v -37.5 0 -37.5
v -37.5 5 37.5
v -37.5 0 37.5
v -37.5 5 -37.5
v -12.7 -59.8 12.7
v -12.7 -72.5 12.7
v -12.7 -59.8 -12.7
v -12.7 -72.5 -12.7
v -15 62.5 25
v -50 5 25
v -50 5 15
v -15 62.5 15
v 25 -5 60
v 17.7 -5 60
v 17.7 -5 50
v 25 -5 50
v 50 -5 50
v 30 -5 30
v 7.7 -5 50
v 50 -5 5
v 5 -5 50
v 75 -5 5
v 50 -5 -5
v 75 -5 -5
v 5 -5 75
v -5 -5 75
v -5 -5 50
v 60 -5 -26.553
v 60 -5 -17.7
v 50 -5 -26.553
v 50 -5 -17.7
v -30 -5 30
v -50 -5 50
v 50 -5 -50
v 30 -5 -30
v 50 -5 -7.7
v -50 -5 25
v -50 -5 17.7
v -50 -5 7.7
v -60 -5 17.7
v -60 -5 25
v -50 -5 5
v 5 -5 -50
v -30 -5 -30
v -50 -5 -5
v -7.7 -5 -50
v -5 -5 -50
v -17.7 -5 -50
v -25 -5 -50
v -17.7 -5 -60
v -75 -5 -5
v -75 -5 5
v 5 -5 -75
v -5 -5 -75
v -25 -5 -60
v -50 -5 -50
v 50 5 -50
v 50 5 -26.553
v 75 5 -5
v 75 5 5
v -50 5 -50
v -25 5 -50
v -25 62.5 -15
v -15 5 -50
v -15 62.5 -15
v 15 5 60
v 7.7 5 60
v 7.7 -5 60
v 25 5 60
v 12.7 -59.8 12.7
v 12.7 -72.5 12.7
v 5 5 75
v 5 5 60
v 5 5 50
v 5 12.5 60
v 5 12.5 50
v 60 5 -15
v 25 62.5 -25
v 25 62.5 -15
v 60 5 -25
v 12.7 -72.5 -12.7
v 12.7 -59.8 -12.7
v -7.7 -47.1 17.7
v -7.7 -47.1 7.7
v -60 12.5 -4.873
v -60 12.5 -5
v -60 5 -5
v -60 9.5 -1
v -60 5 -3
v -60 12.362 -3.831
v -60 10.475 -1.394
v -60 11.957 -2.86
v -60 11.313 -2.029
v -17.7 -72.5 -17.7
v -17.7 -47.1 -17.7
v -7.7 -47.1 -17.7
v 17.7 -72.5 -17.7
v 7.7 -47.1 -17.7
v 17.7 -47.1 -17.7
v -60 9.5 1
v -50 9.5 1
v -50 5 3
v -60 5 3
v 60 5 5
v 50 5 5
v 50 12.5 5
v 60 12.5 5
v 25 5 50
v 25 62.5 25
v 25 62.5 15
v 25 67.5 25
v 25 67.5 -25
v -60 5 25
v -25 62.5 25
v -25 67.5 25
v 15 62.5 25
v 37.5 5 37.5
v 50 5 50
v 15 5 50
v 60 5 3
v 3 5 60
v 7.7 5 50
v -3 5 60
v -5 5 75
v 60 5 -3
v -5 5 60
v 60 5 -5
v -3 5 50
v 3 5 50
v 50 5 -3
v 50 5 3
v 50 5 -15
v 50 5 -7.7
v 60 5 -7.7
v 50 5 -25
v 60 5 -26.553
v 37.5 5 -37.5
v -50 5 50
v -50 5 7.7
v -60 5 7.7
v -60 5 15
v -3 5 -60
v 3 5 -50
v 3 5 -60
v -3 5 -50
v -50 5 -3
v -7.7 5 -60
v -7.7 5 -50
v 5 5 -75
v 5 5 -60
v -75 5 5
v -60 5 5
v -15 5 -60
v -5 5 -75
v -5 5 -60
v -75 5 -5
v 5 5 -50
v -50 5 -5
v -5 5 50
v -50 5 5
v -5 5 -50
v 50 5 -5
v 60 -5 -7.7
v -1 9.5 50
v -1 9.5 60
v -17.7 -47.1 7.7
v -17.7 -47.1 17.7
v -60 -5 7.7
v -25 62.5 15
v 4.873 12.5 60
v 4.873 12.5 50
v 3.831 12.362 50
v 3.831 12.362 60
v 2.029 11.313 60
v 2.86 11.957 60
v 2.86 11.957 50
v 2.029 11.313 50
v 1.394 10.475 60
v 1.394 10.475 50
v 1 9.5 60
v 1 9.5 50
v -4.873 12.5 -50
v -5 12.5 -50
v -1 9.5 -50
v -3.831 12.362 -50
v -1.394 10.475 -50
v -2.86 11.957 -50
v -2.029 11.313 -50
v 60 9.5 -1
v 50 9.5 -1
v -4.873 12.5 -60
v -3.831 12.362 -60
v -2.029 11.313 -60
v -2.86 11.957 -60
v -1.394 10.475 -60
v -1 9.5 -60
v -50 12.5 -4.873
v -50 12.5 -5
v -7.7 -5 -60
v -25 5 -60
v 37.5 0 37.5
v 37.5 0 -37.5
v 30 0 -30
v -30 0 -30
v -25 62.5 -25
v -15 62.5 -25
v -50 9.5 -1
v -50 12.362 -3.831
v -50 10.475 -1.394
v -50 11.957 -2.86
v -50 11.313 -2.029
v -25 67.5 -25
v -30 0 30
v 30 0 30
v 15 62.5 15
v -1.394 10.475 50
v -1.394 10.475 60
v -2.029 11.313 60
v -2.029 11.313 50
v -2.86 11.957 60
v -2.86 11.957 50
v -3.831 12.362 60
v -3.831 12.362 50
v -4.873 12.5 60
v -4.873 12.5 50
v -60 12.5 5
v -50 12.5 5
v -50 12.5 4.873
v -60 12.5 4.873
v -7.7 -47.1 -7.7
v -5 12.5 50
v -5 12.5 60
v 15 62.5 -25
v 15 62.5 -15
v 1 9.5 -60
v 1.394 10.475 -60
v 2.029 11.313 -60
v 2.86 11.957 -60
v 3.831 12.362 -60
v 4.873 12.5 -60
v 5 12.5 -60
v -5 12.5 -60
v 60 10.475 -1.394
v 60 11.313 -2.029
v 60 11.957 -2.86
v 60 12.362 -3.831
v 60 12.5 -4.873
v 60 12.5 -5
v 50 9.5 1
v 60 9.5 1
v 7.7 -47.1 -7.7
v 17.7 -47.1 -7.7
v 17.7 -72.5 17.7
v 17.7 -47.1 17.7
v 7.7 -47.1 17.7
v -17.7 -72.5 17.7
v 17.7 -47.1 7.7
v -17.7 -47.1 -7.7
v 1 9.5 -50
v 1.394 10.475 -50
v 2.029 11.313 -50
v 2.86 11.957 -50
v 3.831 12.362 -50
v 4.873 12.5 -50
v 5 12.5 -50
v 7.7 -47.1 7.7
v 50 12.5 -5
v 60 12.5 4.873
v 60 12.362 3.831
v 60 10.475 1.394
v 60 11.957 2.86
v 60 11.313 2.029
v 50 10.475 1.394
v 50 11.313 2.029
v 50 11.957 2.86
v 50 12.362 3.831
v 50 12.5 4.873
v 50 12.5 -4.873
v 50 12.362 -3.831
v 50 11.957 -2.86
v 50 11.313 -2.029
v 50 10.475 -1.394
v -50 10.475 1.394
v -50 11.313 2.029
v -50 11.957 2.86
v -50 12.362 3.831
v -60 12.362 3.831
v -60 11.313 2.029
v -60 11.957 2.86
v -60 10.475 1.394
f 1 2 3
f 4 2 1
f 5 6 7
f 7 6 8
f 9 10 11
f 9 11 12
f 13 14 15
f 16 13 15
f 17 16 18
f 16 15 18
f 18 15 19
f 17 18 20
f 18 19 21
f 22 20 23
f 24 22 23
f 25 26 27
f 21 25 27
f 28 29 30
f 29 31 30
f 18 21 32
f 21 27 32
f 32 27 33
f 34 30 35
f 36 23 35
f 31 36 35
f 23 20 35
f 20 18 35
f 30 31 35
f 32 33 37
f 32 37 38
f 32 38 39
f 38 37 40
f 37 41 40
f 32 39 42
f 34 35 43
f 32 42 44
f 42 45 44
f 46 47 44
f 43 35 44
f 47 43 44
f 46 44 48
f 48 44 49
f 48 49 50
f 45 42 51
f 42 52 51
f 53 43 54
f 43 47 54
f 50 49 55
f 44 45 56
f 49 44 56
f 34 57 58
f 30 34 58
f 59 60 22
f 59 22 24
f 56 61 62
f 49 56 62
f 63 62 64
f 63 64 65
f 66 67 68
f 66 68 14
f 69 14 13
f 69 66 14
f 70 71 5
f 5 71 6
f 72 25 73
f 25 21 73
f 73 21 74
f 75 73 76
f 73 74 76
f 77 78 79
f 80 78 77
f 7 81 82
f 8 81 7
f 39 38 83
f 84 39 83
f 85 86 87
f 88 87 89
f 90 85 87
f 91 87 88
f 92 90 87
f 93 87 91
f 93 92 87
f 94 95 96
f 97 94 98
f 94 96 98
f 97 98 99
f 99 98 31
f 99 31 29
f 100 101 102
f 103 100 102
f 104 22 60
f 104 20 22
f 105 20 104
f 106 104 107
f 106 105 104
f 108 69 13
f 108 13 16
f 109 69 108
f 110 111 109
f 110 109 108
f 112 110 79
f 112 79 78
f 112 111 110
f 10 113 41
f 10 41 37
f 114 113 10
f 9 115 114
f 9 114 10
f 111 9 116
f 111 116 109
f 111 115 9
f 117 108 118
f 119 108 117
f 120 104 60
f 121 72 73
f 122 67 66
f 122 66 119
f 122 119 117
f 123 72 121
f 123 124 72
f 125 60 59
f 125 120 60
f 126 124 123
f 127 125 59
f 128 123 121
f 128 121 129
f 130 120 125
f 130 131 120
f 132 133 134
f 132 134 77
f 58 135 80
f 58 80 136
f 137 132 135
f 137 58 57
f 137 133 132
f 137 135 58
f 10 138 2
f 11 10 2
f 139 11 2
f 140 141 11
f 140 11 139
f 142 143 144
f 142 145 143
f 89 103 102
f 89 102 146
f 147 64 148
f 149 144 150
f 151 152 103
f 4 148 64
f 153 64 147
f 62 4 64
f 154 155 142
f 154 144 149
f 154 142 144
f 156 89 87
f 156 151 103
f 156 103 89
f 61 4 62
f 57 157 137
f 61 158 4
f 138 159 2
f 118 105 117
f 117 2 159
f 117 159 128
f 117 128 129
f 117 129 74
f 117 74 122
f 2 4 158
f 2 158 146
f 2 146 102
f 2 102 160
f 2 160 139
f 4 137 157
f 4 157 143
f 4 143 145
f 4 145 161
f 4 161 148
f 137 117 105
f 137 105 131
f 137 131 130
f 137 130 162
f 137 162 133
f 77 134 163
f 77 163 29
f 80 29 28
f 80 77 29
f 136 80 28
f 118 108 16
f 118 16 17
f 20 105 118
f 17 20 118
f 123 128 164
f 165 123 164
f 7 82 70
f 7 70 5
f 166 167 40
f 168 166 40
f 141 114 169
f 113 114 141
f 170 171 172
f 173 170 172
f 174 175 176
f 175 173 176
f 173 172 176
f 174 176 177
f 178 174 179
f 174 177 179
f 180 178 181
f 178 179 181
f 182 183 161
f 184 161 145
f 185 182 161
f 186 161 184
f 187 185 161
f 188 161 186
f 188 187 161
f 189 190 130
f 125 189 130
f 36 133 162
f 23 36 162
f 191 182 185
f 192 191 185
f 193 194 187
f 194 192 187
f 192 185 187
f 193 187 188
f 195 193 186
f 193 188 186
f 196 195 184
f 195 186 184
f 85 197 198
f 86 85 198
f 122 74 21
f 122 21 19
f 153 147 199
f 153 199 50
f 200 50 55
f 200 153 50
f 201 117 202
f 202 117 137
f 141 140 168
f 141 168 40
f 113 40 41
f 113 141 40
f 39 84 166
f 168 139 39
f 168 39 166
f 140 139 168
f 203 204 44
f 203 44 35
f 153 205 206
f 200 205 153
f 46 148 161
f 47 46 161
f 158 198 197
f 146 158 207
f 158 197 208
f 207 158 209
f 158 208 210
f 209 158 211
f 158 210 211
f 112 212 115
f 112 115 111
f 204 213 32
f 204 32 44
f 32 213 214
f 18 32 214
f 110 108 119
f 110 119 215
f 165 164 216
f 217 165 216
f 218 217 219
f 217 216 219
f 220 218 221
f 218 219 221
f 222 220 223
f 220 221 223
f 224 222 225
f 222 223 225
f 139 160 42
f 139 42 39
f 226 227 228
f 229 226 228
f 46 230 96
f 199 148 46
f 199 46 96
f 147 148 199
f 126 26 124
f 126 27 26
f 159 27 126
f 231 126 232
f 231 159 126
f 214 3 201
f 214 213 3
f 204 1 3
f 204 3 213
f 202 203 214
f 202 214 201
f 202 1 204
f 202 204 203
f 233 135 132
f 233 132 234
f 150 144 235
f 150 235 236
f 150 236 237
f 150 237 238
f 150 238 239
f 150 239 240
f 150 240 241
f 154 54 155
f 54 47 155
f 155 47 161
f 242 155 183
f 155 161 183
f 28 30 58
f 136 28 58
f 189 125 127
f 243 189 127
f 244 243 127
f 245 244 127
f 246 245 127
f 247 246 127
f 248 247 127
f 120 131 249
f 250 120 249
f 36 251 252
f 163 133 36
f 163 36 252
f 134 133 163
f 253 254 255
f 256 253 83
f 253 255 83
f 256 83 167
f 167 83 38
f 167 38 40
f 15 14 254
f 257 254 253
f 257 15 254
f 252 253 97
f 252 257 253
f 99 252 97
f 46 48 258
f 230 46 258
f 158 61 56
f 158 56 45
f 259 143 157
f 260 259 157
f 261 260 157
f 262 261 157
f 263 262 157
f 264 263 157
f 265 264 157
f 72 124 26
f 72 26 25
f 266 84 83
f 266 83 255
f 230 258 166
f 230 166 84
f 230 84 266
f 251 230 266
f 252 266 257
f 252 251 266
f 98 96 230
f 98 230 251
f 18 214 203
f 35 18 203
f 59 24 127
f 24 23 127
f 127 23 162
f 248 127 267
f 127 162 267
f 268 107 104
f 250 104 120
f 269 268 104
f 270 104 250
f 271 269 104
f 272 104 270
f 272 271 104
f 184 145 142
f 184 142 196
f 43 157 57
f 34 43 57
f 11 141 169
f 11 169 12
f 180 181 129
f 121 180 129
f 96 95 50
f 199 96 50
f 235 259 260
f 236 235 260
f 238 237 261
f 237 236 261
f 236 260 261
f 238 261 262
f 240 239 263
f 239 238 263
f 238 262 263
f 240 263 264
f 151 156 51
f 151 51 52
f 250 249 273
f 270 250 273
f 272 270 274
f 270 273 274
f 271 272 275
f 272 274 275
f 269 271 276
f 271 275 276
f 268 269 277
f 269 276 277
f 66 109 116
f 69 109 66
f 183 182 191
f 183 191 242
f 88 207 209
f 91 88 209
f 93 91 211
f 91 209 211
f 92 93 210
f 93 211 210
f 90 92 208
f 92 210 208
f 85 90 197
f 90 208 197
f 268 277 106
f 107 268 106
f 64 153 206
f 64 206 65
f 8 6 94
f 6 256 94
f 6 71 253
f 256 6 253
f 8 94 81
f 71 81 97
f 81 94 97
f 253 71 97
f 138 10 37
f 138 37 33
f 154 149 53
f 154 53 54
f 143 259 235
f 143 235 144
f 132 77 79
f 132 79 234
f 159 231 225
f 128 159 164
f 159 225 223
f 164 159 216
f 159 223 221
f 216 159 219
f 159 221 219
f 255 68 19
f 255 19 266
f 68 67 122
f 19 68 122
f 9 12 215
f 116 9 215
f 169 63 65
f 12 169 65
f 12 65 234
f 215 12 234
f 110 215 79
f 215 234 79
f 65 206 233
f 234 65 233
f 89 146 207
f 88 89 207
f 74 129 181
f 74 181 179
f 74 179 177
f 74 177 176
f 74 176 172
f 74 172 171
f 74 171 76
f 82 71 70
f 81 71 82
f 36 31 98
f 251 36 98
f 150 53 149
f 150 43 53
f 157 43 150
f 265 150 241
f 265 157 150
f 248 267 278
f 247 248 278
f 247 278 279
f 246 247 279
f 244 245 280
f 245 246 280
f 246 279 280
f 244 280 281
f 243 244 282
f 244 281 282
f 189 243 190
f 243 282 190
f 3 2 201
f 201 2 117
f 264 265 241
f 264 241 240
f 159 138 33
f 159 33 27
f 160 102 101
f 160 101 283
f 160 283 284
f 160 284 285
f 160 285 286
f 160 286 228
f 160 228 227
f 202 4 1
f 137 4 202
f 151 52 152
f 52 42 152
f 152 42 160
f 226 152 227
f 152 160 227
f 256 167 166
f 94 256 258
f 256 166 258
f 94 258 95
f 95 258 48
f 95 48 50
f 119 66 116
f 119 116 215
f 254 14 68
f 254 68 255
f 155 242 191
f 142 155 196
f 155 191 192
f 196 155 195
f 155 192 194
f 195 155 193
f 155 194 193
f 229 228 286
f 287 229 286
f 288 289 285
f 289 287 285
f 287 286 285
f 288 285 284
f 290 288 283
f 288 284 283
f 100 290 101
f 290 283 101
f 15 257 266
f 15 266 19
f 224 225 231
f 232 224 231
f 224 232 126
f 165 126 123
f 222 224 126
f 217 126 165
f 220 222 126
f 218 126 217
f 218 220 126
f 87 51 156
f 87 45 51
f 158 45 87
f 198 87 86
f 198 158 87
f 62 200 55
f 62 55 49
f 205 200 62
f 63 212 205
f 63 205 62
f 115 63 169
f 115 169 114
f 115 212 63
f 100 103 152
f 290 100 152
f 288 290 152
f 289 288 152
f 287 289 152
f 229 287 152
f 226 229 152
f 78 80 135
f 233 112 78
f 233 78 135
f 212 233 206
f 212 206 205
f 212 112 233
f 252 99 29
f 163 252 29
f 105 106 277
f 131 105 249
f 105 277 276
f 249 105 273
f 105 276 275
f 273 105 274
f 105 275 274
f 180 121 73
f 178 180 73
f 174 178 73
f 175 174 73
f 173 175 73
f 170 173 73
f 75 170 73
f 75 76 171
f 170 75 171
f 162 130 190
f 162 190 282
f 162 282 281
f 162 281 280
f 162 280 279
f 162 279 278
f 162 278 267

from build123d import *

# Parameters (mm, degrees)
SKETCH2_W            = 100
SKETCH2_H            = 100
BOSS_EXTRUDE1_DEPTH  = 5
SKETCH3_W            = 100
SKETCH3_H            = 100
BOSS_EXTRUDE2_DEPTH  = 5
SKETCH8_R            = 5
BOSS_EXTRUDE7_DEPTH  = 30
BOSS_EXTRUDE21_DEPTH = 10
FILLET14_R           = 4
FILLET13_R           = 4
SKETCH24_W           = 10
SKETCH24_H           = 10
BOSS_EXTRUDE22_DEPTH = 15
BOSS_EXTRUDE25_DEPTH = 10
SKETCH26_W           = 10
SKETCH26_H           = 10
BOSS_EXTRUDE26_DEPTH = 15
FILLET18_R           = 4
FILLET17_R           = 4
BOSS_EXTRUDE23_DEPTH = 10
SKETCH25_W           = 10
SKETCH25_H           = 10
BOSS_EXTRUDE24_DEPTH = 15
FILLET15_R           = 4
FILLET16_R           = 4
BOSS_EXTRUDE10_DEPTH = 10
FILLET19_R           = 4
SKETCH27_W           = 10
SKETCH27_H           = 10
BOSS_EXTRUDE27_DEPTH = 15
FILLET20_R           = 4
SKETCH62_R           = 11.223510807
CUT_EXTRUDE3_DEPTH   = 30
SKETCH64_W           = 35.4
SKETCH64_H           = 35.4
BOSS_EXTRUDE53_DEPTH = 25.4
SKETCH66_W           = 25.4
SKETCH66_H           = 25.4
CUT_EXTRUDE4_DEPTH   = 12.7
SKETCH67_W           = 50
SKETCH67_H           = 50
BOSS_EXTRUDE54_DEPTH = 5
SKETCH68_W           = 17.3
SKETCH68_H           = 10
BOSS_EXTRUDE55_DEPTH = 10
SKETCH69_W           = 17.3
SKETCH69_H           = 10
BOSS_EXTRUDE56_DEPTH = 10
SKETCH70_W           = 17.3
SKETCH70_H           = 10
BOSS_EXTRUDE57_DEPTH = 10
SKETCH74_W           = 17.3
SKETCH74_H           = 10
BOSS_EXTRUDE58_DEPTH = 10
BOSS_EXTRUDE59_DEPTH = 10
BOSS_EXTRUDE60_DEPTH = 10
BOSS_EXTRUDE61_DEPTH = 10
BOSS_EXTRUDE62_DEPTH = 10
BOSS_EXTRUDE63_DEPTH = 10
BOSS_EXTRUDE64_DEPTH = 10
SKETCH85_W           = 17.3
SKETCH85_H           = 10
BOSS_EXTRUDE65_DEPTH = 10
BOSS_EXTRUDE66_DEPTH = 10
BOSS_EXTRUDE67_DEPTH = 10
SKETCH90_W           = 75
SKETCH90_H           = 75
CUT_EXTRUDE5_DEPTH   = 5
SKETCH91_W           = 60
SKETCH91_H           = 60
CUT_EXTRUDE6_DEPTH   = 10


with BuildPart() as part:
    # Sketch2 → Boss-Extrude1 (new body)
    with BuildSketch(Plane(origin=(0, 0, 0), x_dir=(1, 0, 0), z_dir=(0, 1, 0))):
        Rectangle(SKETCH2_W, SKETCH2_H)
    extrude(amount=BOSS_EXTRUDE1_DEPTH)

    # Sketch3 → Boss-Extrude2 (add)
    with BuildSketch(Plane.XZ):
        Rectangle(SKETCH3_W, SKETCH3_H)
    extrude(amount=BOSS_EXTRUDE2_DEPTH)

    # Sketch8 → Boss-Extrude7 (add)
    with BuildSketch(Plane.XZ.offset(5)):
        with Locations(Location((0, 0, 0), (0, 0, 90))):
            Circle(SKETCH8_R)
    extrude(amount=BOSS_EXTRUDE7_DEPTH)

    # Sketch11 → Boss-Extrude21 (add)
    with BuildSketch(Plane(origin=(50, 0, 0), x_dir=(0, 0, -1), z_dir=(1, 0, 0))):
        Polygon((5, -5), (5, 12.5), (1, 12.5), (1, 9.5), (3, 5), (-3, 5), (-1, 9.5), (-1, 12.5), (-5, 12.5), (-5, -5), align=None)
    extrude(amount=BOSS_EXTRUDE21_DEPTH)

    # Fillet14
    # the kernel refuses this fillet: 4 mm, written as the material it takes off along each edge
    with BuildSketch(Plane(origin=(40.317541634, 12.5, -1), x_dir=(0, -1, 0), z_dir=(1, 0, 0))) as fillet14_piece_1:
        with BuildLine():
            CenterArc((4, 3.872983346), FILLET14_R, 180, 75.522487814)
            Line((0, 3.872983346), (-0.08, 3.872983346))
            Line((-0.08, 3.872983346), (-0.08, 0))
            Line((-0.08, 0), (0, -0.08))
            ThreePointArc((0, -0.08), (1.5, -0.08), (2.98, -0.077459667))
            Line((2.98, -0.077459667), (3, 0))
        make_face()
    extrude(amount=29.364916731, mode=Mode.SUBTRACT)

    # Fillet13
    # the kernel refuses this fillet: 4 mm, written as the material it takes off along each edge
    with BuildSketch(Plane(origin=(40.317541634, 12.5, 1), x_dir=(0, 0, 1), z_dir=(1, 0, 0))) as fillet13_piece_1:
        with BuildLine():
            CenterArc((3.872983346, 4), FILLET13_R, 194.477512186, 75.522487814)
            Line((0, 3), (-0.077459667, 2.98))
            ThreePointArc((-0.077459667, 2.98), (-0.08, 1.5), (-0.08, 0))
            Line((-0.08, 0), (0, -0.08))
            Line((0, -0.08), (3.872983346, -0.08))
            Line((3.872983346, -0.08), (3.872983346, 0))
        make_face()
    extrude(amount=29.364916731, mode=Mode.SUBTRACT)

    # Sketch24 → Boss-Extrude22 (add)
    with BuildSketch(Plane(origin=(60, 0, 0), x_dir=(0, 0, -1), z_dir=(1, 0, 0))):
        Rectangle(SKETCH24_W, SKETCH24_H)
    extrude(amount=BOSS_EXTRUDE22_DEPTH)

    # Sketch13 → Boss-Extrude25 (add)
    with BuildSketch(Plane.ZY.offset(50)):
        Polygon((-5, 12.5), (-5, -5), (5, -5), (5, 12.5), (1, 12.5), (1, 9.5), (3, 5), (-3, 5), (-1, 9.5), (-1, 12.5), align=None)
    extrude(amount=BOSS_EXTRUDE25_DEPTH)

    # Sketch26 → Boss-Extrude26 (add)
    with BuildSketch(Plane.ZY.offset(60)):
        Rectangle(SKETCH26_W, SKETCH26_H)
    extrude(amount=BOSS_EXTRUDE26_DEPTH)

    # Fillet18
    # the kernel refuses this fillet: 4 mm, written as the material it takes off along each edge
    with BuildSketch(Plane(origin=(-40.317541634, 12.5, 1), x_dir=(0, -1, 0), z_dir=(-1, 0, 0))) as fillet18_piece_1:
        with BuildLine():
            CenterArc((4, 3.872983346), FILLET18_R, 180, 75.522487814)
            Line((0, 3.872983346), (-0.08, 3.872983346))
            Line((-0.08, 3.872983346), (-0.08, 0))
            Line((-0.08, 0), (0, -0.08))
            ThreePointArc((0, -0.08), (1.5, -0.08), (2.98, -0.077459667))
            Line((2.98, -0.077459667), (3, 0))
        make_face()
    extrude(amount=29.364916731, mode=Mode.SUBTRACT)

    # Fillet17
    # the kernel refuses this fillet: 4 mm, written as the material it takes off along each edge
    with BuildSketch(Plane(origin=(-40.317541634, 12.5, -1), x_dir=(0, 0, -1), z_dir=(-1, 0, 0))) as fillet17_piece_1:
        with BuildLine():
            CenterArc((3.872983346, 4), FILLET17_R, 194.477512186, 75.522487814)
            Line((0, 3), (-0.077459667, 2.98))
            ThreePointArc((-0.077459667, 2.98), (-0.08, 1.5), (-0.08, 0))
            Line((-0.08, 0), (0, -0.08))
            Line((0, -0.08), (3.872983346, -0.08))
            Line((3.872983346, -0.08), (3.872983346, 0))
        make_face()
    extrude(amount=29.364916731, mode=Mode.SUBTRACT)

    # Sketch14 → Boss-Extrude23 (add)
    with BuildSketch(Plane(origin=(0, 0, -50), x_dir=(-1, 0, 0), z_dir=(0, 0, -1))):
        Polygon((-5, 12.5), (-1, 12.5), (-1, 9.5), (-3, 5), (3, 5), (1, 9.5), (1, 12.5), (5, 12.5), (5, -5), (-5, -5), align=None)
    extrude(amount=BOSS_EXTRUDE23_DEPTH)

    # Sketch25 → Boss-Extrude24 (add)
    with BuildSketch(Plane(origin=(0, 0, -60), x_dir=(-1, 0, 0), z_dir=(0, 0, -1))):
        Rectangle(SKETCH25_W, SKETCH25_H)
    extrude(amount=BOSS_EXTRUDE24_DEPTH)

    # Fillet15
    # the kernel refuses this fillet: 4 mm, written as the material it takes off along each edge
    with BuildSketch(Plane(origin=(-1, 12.5, -40.317541634), x_dir=(0, -1, 0), z_dir=(0, 0, -1))) as fillet15_piece_1:
        with BuildLine():
            CenterArc((4, 3.872983346), FILLET15_R, 180, 75.522487814)
            Line((0, 3.872983346), (-0.08, 3.872983346))
            Line((-0.08, 3.872983346), (-0.08, 0))
            Line((-0.08, 0), (0, -0.08))
            ThreePointArc((0, -0.08), (1.5, -0.08), (2.98, -0.077459667))
            Line((2.98, -0.077459667), (3, 0))
        make_face()
    extrude(amount=29.364916731, mode=Mode.SUBTRACT)

    # Fillet16
    # the kernel refuses this fillet: 4 mm, written as the material it takes off along each edge
    with BuildSketch(Plane(origin=(1, 12.5, -40.317541634), x_dir=(0, -1, 0), z_dir=(0, 0, -1))) as fillet16_piece_1:
        with BuildLine():
            CenterArc((4, -3.872983346), FILLET16_R, 104.477512186, 75.522487814)
            Line((0, -3.872983346), (-0.08, -3.872983346))
            Line((-0.08, -3.872983346), (-0.08, 0))
            Line((-0.08, 0), (0, 0.08))
            ThreePointArc((0, 0.08), (1.5, 0.08), (2.98, 0.077459667))
            Line((2.98, 0.077459667), (3, 0))
        make_face()
    extrude(amount=29.364916731, mode=Mode.SUBTRACT)

    # Sketch12 → Boss-Extrude10 (add)
    with BuildSketch(Plane.XY.offset(50)):
        Polygon((-5, 12.5), (-5, -5), (5, -5), (5, 12.5), (1, 12.5), (1, 9.5), (3, 5), (-3, 5), (-1, 9.5), (-1, 12.5), align=None)
    extrude(amount=BOSS_EXTRUDE10_DEPTH)

    # Fillet19
    # the kernel refuses this fillet: 4 mm, written as the material it takes off along each edge
    with BuildSketch(Plane(origin=(-1, 12.5, 40.317541634), x_dir=(-1, 0, 0), z_dir=(0, 0, 1))) as fillet19_piece_1:
        with BuildLine():
            CenterArc((3.872983346, 4), FILLET19_R, 194.477512186, 75.522487814)
            Line((0, 3), (-0.077459667, 2.98))
            ThreePointArc((-0.077459667, 2.98), (-0.08, 1.5), (-0.08, 0))
            Line((-0.08, 0), (0, -0.08))
            Line((0, -0.08), (3.872983346, -0.08))
            Line((3.872983346, -0.08), (3.872983346, 0))
        make_face()
    extrude(amount=29.364916731, mode=Mode.SUBTRACT)

    # Sketch27 → Boss-Extrude27 (add)
    with BuildSketch(Plane.XY.offset(60)):
        Rectangle(SKETCH27_W, SKETCH27_H)
    extrude(amount=BOSS_EXTRUDE27_DEPTH)

    # Fillet20
    # the kernel refuses this fillet: 4 mm, written as the material it takes off along each edge
    with BuildSketch(Plane(origin=(1, 12.5, 40.317541634), x_dir=(1, 0, 0), z_dir=(0, 0, 1))) as fillet20_piece_1:
        with BuildLine():
            CenterArc((3.872983346, -4), FILLET20_R, 90, 75.522487814)
            Line((0, -3), (-0.077459667, -2.98))
            ThreePointArc((-0.077459667, -2.98), (-0.08, -1.5), (-0.08, 0))
            Line((-0.08, 0), (0, 0.08))
            Line((0, 0.08), (3.872983346, 0.08))
            Line((3.872983346, 0.08), (3.872983346, 0))
        make_face()
    extrude(amount=29.364916731, mode=Mode.SUBTRACT)

    # Sketch62 → Cut-Extrude3 (cut)
    with BuildSketch(Plane.XZ.offset(5)):
        Circle(SKETCH62_R)
    extrude(amount=CUT_EXTRUDE3_DEPTH, mode=Mode.SUBTRACT)

    # Sketch68 → Boss-Extrude55 (add)
    with BuildSketch(Plane.XY.offset(50)):
        with Locations((16.35, 0)):
            Rectangle(SKETCH68_W, SKETCH68_H)
    extrude(amount=BOSS_EXTRUDE55_DEPTH)

    # Sketch69 → Boss-Extrude56 (add)
    with BuildSketch(Plane(origin=(50, 0, 0), x_dir=(0, 0, -1), z_dir=(1, 0, 0))):
        with Locations((17.90253263, 0)):
            Rectangle(SKETCH69_W, SKETCH69_H)
    extrude(amount=BOSS_EXTRUDE56_DEPTH)

    # Sketch70 → Boss-Extrude57 (add)
    with BuildSketch(Plane(origin=(0, 0, -50), x_dir=(-1, 0, 0), z_dir=(0, 0, -1))):
        with Locations((16.35, 0)):
            Rectangle(SKETCH70_W, SKETCH70_H)
    extrude(amount=BOSS_EXTRUDE57_DEPTH)

    # Sketch74 → Boss-Extrude58 (add)
    with BuildSketch(Plane.ZY.offset(50)):
        with Locations((16.35, 0)):
            Rectangle(SKETCH74_W, SKETCH74_H)
    extrude(amount=BOSS_EXTRUDE58_DEPTH)



with BuildPart() as body_2:
    # Sketch64 → Boss-Extrude53 (new body)
    with BuildSketch(Plane(origin=(0, -72.5, 0), x_dir=(1, 0, 0), z_dir=(0, 1, 0))):
        Rectangle(SKETCH64_W, SKETCH64_H)
    extrude(amount=BOSS_EXTRUDE53_DEPTH)

    # Sketch66 → Cut-Extrude4 (cut)
    with BuildSketch(Plane(origin=(0, -72.5, 0), x_dir=(-1, 0, 0), z_dir=(0, -1, 0))):
        Rectangle(SKETCH66_W, SKETCH66_H)
    extrude(amount=-CUT_EXTRUDE4_DEPTH, mode=Mode.SUBTRACT)


with BuildPart() as body_3:
    # Sketch67 → Boss-Extrude54 (new body)
    with BuildSketch(Plane(origin=(0, 67.5, 0), x_dir=(1, 0, 0), z_dir=(0, 1, 0))):
        Rectangle(SKETCH67_W, SKETCH67_H)
    extrude(amount=-BOSS_EXTRUDE54_DEPTH)


with BuildPart() as part_1:
    add(part.part)

    add(body_2.part)  # Boss-Extrude59 merges body 2
    # Sketch76 → Boss-Extrude59 (add)
    with BuildSketch(Plane.ZY.offset(17.7)):
        Polygon((-17.7, -47.1), (-60, -5), (-50, -5), (-7.7, -47.1), align=None)
    extrude(amount=-BOSS_EXTRUDE59_DEPTH)


    add(body_3.part)  # Boss-Extrude60 merges body 3
    # Sketch77 → Boss-Extrude60 (add)
    with BuildSketch(Plane.ZY.offset(25)):
        Polygon((-25, 62.5), (-60, 5), (-50, 5), (-15, 62.5), align=None)
    extrude(amount=-BOSS_EXTRUDE60_DEPTH)

    # Sketch78 → Boss-Extrude61 (add)
    with BuildSketch(Plane.XY.offset(17.7)):
        Polygon((-17.7, -47.1), (-60, -5), (-50, -5), (-7.7, -47.1), align=None)
    extrude(amount=-BOSS_EXTRUDE61_DEPTH)

    # Sketch79 → Boss-Extrude62 (add)
    with BuildSketch(Plane.XY.offset(25)):
        Polygon((-25, 62.5), (-60, 5), (-50, 5), (-15, 62.5), align=None)
    extrude(amount=-BOSS_EXTRUDE62_DEPTH)

    # Sketch82 → Boss-Extrude63 (add)
    with BuildSketch(Plane(origin=(17.7, 0, 0), x_dir=(0, 0, -1), z_dir=(1, 0, 0))):
        Polygon((-60, -5), (-17.7, -47.1), (-7.7, -47.1), (-50, -5), align=None)
    extrude(amount=-BOSS_EXTRUDE63_DEPTH)

    # Sketch83 → Boss-Extrude64 (add)
    with BuildSketch(Plane(origin=(25, 0, 0), x_dir=(0, 0, -1), z_dir=(1, 0, 0))):
        Polygon((-25, 62.5), (-60, 5), (-50, 5), (-15, 62.5), align=None)
    extrude(amount=-BOSS_EXTRUDE64_DEPTH)

    # Sketch85 → Boss-Extrude65 (add)
    with BuildSketch(Plane(origin=(50, 0, 0), x_dir=(0, 0, -1), z_dir=(1, 0, 0))):
        with Locations((16.35, 0)):
            Rectangle(SKETCH85_W, SKETCH85_H)
    extrude(amount=BOSS_EXTRUDE65_DEPTH)

    # Sketch86 → Boss-Extrude66 (add)
    with BuildSketch(Plane(origin=(0, 0, -25), x_dir=(-1, 0, 0), z_dir=(0, 0, -1))):
        Polygon((-25, 62.5), (-60, 5), (-50, 5), (-15, 62.5), align=None)
    extrude(amount=-BOSS_EXTRUDE66_DEPTH)

    # Sketch89 → Boss-Extrude67 (add)
    with BuildSketch(Plane(origin=(0, 0, -17.7), x_dir=(-1, 0, 0), z_dir=(0, 0, -1))):
        Polygon((-60, -5), (-50, -5), (-7.7, -47.1), (-17.7, -47.1), align=None)
    extrude(amount=-BOSS_EXTRUDE67_DEPTH)

    # Sketch90 → Cut-Extrude5 (cut)
    with BuildSketch(Plane(origin=(0, 5, 0), x_dir=(1, 0, 0), z_dir=(0, 1, 0))):
        Rectangle(SKETCH90_W, SKETCH90_H)
    extrude(amount=-CUT_EXTRUDE5_DEPTH, mode=Mode.SUBTRACT)

    # Sketch91 → Cut-Extrude6 (cut)
    with BuildSketch(Plane(origin=(0, 5, 0), x_dir=(1, 0, 0), z_dir=(0, 1, 0))):
        Rectangle(SKETCH91_W, SKETCH91_H)
    extrude(amount=-CUT_EXTRUDE6_DEPTH, mode=Mode.SUBTRACT)


solid = part_1.part
